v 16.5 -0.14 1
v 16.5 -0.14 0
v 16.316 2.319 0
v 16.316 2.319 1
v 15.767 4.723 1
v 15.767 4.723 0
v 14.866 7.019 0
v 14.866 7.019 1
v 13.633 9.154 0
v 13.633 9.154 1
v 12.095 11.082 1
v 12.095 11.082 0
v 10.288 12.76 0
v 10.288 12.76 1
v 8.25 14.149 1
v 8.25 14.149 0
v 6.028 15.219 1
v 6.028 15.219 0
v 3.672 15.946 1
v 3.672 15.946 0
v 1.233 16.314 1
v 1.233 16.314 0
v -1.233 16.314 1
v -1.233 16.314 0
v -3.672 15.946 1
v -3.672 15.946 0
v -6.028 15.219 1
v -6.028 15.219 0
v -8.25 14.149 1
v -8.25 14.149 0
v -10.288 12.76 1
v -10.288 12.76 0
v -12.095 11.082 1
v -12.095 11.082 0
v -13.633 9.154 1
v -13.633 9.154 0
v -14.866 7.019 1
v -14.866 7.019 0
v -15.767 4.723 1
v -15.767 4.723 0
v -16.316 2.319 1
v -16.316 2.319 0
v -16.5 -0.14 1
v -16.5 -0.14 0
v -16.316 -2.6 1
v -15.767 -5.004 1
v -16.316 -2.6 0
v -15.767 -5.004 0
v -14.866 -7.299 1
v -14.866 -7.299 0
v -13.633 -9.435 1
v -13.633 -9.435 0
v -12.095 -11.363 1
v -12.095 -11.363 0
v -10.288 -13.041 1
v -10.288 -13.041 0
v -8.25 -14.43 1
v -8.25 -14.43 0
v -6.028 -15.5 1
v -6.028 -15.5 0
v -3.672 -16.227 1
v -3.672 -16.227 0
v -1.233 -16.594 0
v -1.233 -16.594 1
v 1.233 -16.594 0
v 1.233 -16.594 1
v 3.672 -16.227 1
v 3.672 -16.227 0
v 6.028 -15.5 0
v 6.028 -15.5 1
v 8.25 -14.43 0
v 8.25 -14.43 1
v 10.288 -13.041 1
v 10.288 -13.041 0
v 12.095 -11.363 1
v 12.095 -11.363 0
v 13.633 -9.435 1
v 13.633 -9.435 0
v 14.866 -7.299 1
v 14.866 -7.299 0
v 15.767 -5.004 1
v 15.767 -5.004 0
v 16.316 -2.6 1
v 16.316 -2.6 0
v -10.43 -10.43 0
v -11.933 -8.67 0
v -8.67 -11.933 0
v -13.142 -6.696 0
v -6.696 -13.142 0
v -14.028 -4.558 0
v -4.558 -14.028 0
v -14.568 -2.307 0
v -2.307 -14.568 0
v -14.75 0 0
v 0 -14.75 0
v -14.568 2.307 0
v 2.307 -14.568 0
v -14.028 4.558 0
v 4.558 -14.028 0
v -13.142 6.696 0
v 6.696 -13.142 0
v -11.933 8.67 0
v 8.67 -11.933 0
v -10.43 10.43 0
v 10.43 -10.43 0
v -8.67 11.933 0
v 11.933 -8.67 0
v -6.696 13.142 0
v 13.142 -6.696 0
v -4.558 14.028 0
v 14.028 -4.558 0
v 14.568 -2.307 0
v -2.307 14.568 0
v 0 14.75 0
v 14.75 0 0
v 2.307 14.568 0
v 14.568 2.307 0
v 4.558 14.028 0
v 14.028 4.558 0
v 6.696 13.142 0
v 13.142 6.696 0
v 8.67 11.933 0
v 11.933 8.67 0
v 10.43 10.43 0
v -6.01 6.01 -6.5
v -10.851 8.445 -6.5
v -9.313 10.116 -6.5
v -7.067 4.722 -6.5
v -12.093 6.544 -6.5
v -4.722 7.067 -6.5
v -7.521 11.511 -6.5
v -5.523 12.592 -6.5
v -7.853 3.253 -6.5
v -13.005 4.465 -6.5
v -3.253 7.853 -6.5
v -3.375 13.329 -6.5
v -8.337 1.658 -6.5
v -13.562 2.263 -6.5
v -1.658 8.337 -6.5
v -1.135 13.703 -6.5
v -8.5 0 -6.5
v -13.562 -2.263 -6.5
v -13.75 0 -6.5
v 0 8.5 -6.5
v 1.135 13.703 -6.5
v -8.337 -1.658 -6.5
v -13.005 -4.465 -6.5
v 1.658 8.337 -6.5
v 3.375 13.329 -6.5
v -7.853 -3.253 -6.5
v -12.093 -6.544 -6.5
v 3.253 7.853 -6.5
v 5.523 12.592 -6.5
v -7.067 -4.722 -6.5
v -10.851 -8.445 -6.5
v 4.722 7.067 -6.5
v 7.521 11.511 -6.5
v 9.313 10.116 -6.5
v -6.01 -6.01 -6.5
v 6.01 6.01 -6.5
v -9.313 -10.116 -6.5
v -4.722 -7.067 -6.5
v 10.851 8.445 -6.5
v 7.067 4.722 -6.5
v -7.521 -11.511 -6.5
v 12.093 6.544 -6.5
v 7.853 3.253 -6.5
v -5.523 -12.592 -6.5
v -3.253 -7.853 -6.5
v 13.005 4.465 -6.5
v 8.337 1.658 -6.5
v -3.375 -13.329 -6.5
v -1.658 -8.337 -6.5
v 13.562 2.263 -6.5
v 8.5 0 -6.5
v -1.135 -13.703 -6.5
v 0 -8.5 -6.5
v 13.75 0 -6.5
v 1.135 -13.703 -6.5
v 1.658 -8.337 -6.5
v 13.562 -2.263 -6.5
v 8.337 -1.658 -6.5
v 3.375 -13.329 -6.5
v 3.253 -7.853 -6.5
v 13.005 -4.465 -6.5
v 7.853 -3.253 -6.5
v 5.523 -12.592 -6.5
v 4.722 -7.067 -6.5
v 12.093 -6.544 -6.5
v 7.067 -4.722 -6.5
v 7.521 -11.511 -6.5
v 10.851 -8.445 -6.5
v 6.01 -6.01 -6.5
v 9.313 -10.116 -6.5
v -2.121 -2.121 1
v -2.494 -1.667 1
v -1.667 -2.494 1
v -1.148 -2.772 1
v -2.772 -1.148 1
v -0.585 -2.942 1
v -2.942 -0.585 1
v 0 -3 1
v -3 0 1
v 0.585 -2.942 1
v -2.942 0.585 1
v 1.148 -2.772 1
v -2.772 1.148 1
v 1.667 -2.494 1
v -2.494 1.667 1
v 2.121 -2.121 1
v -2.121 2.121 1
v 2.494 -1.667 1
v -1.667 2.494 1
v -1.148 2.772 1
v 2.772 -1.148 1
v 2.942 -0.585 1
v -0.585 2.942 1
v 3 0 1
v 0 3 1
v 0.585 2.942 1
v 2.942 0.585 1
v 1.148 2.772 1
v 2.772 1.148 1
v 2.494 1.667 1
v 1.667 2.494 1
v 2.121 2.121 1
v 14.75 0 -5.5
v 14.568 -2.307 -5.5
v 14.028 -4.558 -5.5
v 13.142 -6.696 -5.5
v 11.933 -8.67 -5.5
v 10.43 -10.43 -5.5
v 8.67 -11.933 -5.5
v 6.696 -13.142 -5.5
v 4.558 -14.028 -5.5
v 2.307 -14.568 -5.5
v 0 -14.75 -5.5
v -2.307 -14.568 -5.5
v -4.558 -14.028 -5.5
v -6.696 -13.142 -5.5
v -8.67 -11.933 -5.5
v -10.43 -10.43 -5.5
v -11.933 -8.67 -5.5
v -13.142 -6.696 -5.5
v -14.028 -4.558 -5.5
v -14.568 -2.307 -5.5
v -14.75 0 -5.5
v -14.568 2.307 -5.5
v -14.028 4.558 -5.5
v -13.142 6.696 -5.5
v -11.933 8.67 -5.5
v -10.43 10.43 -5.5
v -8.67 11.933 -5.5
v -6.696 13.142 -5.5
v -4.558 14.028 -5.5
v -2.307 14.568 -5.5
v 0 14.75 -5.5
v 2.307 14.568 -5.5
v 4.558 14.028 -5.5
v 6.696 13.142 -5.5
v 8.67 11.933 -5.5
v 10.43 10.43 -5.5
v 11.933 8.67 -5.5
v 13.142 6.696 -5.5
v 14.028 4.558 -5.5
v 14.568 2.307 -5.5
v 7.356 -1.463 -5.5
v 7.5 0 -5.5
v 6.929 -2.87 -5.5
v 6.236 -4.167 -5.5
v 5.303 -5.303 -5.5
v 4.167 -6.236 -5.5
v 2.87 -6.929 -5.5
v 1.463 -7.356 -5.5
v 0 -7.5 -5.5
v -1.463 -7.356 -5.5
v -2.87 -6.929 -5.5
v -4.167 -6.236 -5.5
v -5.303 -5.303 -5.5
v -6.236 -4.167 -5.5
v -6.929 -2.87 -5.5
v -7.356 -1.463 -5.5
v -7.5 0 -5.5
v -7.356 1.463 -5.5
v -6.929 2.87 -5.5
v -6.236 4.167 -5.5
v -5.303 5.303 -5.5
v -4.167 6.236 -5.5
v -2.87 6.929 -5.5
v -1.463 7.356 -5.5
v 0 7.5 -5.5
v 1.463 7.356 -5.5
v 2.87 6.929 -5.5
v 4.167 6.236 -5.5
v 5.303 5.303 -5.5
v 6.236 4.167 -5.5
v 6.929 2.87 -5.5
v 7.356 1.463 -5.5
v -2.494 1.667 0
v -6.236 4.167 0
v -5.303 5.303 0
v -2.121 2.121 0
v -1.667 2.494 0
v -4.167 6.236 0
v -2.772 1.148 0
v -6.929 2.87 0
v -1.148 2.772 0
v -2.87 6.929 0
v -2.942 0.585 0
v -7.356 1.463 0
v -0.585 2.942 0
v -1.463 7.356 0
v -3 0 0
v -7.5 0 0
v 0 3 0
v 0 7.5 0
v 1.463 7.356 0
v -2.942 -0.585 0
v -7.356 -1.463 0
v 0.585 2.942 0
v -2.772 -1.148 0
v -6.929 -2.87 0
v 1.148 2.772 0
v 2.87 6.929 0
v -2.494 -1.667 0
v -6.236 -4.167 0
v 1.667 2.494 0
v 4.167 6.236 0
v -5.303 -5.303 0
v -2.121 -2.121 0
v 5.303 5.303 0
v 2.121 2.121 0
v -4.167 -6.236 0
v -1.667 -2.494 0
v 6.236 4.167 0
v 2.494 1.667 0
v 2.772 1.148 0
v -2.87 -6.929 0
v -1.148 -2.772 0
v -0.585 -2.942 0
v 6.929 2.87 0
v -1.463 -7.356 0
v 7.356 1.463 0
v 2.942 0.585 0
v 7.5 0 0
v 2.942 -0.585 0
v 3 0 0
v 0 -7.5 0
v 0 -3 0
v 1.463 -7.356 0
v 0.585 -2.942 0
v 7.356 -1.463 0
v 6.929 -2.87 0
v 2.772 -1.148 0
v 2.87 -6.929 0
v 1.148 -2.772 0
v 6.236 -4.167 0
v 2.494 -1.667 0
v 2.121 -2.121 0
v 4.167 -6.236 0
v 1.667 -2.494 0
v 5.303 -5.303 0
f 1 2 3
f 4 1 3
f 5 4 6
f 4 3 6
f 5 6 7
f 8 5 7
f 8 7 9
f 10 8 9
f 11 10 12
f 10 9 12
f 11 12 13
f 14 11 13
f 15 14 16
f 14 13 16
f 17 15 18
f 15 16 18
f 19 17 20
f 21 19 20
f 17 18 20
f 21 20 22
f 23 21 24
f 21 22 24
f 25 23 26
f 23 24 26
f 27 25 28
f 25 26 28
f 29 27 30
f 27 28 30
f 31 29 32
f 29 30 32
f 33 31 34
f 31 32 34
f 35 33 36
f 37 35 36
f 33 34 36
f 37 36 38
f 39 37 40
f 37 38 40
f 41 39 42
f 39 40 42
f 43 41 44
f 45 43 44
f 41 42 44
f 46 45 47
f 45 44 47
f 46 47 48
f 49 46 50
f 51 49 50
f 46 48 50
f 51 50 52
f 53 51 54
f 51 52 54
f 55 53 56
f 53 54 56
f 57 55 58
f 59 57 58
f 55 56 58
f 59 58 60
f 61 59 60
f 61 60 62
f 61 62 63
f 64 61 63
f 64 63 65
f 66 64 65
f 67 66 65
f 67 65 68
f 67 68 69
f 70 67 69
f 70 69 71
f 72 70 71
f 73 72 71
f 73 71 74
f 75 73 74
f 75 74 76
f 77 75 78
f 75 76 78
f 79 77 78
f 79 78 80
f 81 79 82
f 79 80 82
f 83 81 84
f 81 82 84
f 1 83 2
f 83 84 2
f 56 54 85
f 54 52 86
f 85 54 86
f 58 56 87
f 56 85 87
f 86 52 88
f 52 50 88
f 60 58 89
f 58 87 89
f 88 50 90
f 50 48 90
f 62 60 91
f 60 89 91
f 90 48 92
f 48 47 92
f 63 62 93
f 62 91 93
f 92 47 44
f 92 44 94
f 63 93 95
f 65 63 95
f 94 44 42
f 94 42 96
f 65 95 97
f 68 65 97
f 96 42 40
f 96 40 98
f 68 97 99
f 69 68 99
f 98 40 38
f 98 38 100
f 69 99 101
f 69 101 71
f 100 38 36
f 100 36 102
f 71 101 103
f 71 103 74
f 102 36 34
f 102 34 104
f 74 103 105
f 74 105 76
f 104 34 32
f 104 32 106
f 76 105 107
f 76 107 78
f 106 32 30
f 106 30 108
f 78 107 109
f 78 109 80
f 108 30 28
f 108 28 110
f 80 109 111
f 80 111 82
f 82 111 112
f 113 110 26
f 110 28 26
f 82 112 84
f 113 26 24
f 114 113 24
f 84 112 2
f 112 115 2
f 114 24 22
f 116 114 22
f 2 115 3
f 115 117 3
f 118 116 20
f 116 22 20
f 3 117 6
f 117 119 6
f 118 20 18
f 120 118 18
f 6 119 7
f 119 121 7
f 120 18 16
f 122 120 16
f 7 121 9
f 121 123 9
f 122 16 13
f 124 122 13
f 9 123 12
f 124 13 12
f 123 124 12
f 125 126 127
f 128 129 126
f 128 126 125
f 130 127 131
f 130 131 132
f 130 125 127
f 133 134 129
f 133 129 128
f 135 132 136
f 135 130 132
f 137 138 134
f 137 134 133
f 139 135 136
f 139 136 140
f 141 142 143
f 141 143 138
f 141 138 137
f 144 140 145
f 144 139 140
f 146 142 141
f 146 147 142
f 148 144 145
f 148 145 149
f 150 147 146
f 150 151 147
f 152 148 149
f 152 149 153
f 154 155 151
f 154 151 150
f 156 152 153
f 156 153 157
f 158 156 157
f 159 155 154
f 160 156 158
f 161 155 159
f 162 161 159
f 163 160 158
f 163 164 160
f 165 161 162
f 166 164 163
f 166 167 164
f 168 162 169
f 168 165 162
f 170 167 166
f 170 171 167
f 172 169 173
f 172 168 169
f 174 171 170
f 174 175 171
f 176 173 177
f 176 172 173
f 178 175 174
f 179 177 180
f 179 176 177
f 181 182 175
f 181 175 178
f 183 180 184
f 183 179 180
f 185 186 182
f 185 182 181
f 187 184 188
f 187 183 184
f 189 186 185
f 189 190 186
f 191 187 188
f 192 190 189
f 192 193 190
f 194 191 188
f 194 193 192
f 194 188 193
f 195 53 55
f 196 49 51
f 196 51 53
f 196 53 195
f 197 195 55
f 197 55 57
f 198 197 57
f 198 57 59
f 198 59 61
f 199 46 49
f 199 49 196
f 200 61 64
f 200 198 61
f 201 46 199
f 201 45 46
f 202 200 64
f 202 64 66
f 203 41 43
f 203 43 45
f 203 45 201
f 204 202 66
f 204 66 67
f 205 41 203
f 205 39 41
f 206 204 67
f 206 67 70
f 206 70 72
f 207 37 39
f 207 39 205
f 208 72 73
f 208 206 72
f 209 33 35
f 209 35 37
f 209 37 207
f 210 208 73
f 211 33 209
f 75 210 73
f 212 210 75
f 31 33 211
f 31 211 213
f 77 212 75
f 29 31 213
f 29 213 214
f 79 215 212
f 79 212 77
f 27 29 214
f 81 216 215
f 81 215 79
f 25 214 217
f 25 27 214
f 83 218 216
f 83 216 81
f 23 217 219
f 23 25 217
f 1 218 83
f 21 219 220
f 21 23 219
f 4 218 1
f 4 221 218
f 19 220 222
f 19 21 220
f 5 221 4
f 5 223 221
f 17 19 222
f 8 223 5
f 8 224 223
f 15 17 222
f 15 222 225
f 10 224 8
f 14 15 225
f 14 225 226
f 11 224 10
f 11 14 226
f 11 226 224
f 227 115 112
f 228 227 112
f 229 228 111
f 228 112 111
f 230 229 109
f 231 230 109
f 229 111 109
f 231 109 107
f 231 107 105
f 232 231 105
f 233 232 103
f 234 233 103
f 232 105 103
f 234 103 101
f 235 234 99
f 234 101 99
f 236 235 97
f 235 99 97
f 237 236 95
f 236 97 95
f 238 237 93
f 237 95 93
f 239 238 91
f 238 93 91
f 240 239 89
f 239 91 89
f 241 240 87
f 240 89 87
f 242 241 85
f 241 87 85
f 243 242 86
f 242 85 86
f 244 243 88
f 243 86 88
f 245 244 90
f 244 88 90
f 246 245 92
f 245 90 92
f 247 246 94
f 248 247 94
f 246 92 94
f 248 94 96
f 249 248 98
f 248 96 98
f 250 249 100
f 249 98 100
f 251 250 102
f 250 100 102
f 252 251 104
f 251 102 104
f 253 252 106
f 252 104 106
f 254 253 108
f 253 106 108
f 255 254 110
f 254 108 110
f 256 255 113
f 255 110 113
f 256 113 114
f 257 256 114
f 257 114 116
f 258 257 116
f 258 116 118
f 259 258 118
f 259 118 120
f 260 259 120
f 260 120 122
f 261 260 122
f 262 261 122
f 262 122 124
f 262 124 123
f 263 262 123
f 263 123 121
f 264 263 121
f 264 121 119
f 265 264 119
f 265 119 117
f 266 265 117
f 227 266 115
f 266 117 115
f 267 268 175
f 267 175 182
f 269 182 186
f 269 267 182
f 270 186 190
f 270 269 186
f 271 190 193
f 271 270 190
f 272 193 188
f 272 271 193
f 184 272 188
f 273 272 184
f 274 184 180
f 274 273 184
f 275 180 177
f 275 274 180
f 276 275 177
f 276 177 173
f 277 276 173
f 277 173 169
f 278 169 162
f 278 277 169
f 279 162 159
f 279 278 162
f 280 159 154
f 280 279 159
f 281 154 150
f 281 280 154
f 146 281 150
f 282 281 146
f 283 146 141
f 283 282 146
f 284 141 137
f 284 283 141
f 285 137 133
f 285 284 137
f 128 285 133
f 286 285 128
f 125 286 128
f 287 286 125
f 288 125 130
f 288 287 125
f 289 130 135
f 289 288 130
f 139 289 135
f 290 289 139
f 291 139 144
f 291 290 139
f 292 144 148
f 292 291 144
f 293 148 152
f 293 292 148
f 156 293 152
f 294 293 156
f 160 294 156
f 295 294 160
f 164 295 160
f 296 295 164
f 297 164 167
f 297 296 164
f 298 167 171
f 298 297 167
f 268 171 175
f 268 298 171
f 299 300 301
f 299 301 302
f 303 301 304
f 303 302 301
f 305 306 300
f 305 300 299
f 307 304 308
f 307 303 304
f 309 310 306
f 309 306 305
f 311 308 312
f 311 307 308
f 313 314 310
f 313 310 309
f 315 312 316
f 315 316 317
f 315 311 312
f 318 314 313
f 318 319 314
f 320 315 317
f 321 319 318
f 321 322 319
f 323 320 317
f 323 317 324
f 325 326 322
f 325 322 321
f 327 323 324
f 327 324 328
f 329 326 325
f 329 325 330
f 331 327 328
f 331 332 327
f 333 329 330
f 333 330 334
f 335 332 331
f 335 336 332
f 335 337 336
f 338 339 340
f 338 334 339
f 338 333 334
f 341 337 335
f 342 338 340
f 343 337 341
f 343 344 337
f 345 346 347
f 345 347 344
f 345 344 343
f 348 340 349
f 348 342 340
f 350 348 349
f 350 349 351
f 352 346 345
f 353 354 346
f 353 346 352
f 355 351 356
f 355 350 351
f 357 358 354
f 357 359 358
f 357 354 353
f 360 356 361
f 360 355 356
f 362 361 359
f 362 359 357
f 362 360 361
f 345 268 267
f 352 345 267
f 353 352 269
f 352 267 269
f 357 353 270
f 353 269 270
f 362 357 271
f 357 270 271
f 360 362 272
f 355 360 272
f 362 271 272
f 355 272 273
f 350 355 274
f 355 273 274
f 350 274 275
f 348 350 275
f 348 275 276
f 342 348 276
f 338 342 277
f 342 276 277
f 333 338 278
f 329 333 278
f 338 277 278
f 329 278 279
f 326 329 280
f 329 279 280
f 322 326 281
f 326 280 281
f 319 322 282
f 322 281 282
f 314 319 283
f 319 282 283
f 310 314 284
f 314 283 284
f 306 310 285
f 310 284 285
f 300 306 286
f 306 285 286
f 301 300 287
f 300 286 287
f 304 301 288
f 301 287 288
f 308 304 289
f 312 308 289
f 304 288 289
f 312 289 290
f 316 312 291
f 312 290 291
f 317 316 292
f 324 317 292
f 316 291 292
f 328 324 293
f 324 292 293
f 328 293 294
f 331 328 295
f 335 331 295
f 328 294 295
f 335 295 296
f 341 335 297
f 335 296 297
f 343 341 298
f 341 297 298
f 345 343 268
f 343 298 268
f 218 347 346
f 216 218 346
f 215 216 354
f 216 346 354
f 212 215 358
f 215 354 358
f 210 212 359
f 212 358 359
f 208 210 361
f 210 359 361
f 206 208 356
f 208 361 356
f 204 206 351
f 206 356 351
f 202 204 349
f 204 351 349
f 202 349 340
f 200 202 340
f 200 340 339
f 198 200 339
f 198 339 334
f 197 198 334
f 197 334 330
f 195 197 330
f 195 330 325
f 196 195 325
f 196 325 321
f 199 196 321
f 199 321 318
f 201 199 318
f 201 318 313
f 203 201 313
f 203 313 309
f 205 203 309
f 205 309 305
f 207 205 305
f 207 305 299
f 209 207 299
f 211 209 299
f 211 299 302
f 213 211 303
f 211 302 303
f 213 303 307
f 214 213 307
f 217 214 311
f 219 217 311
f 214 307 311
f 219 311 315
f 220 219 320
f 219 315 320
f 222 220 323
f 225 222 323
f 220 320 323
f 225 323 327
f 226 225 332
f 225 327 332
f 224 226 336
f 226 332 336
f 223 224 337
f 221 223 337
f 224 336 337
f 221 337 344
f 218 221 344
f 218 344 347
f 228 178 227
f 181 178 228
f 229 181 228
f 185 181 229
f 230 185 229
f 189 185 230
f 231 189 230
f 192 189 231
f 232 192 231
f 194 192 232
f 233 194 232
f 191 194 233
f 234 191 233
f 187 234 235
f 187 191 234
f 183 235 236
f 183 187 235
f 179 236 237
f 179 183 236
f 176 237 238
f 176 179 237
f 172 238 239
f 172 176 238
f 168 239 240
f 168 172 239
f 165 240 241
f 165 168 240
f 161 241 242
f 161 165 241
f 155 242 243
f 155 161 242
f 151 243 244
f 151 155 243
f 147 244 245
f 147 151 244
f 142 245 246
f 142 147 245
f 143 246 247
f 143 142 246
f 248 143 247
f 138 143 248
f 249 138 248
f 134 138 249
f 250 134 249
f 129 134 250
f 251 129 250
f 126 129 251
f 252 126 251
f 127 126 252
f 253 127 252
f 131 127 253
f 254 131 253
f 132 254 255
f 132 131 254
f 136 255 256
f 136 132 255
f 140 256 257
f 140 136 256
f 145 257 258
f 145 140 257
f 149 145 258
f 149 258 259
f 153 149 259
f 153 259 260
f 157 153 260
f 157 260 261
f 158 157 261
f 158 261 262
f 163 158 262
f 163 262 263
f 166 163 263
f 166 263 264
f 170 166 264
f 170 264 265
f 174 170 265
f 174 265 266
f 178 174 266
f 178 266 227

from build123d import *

# Parameters (mm, degrees)
F0_R     = 16.5
F1_DEPTH = 1
F2_R     = 14.75
F3_DEPTH = 6.5
F4_R     = 3
F5_DEPTH = 25
F6_R     = 7.5
F7_DEPTH = 6.5
F8_SIZE  = 1


with BuildPart() as f1:
    # F0 (on Top) → F1 (new body)
    with BuildSketch(Plane.XY):
        with Locations((1e-06, -0.140358)):
            Circle(F0_R)
    extrude(amount=F1_DEPTH)

    # F2 (on face) → F3 (join)
    with BuildSketch(Plane(origin=(0, 0, 0), x_dir=(1, 0, 0), z_dir=(0, 0, -1))):
        Circle(F2_R)
    extrude(amount=F3_DEPTH)

    # F4 (on face) → F5 (cut)
    with BuildSketch(Plane(origin=(0, 0, -6.5), x_dir=(1, 0, 0), z_dir=(0, 0, -1))):
        Circle(F4_R)
    extrude(amount=-F5_DEPTH, mode=Mode.SUBTRACT)

    # F6 (on face) → F7 (cut, through all)
    with BuildSketch(Plane(origin=(0, 0, -6.5), x_dir=(1, 0, 0), z_dir=(0, 0, -1))):
        Circle(F6_R)
    extrude(amount=-F7_DEPTH, mode=Mode.SUBTRACT)

    # F8
    f8_edges = [f1.edges().sort_by_distance(p)[0] for p in [
        (-7.5, 0, -6.5),
        (-14.75, 0, -6.5),
    ]]
    chamfer(f8_edges, length=F8_SIZE)


solid = f1.part
